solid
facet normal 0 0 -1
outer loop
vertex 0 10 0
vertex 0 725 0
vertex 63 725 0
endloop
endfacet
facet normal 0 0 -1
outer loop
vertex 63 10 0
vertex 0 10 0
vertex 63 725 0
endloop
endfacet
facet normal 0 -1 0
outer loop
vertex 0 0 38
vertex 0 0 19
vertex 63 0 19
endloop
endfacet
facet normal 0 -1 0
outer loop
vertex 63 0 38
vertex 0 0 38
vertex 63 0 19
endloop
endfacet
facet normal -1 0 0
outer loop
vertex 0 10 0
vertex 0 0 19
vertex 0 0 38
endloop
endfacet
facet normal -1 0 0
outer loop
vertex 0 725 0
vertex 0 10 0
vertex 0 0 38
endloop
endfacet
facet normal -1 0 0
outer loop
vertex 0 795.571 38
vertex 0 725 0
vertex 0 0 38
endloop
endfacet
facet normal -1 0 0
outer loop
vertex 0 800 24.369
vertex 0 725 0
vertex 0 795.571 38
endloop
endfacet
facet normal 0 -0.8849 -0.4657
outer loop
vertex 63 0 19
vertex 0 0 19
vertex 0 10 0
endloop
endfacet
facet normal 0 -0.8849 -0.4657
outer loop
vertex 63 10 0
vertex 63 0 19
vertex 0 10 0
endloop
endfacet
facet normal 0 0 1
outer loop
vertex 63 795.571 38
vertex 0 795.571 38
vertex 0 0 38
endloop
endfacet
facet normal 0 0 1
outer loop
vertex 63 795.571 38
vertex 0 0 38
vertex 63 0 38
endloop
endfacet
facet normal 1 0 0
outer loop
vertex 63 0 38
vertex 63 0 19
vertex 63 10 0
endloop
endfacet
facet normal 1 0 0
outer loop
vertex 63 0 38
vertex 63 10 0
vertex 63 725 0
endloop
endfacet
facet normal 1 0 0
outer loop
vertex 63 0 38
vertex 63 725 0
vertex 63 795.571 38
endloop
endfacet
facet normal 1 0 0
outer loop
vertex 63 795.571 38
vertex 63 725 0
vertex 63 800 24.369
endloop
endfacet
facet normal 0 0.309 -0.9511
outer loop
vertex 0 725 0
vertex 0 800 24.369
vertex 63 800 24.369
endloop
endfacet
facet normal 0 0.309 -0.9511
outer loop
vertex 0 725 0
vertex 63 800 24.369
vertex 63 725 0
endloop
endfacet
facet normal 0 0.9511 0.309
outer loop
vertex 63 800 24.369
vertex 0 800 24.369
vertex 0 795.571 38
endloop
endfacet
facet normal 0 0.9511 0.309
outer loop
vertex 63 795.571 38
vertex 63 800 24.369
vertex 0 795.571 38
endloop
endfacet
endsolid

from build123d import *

# Parameters (mm, degrees)
ESQUISSE1_W             = 63
ESQUISSE1_H             = 800
BOSS_EXTRU_1_DEPTH      = 38
ENL_V_MAT_EXTRU_1_DEPTH = 804.376001633
ENL_V_MAT_EXTRU_2_DEPTH = 804.376001633


with BuildPart() as part:
    # Esquisse1 → Boss.-Extru.1 (new body)
    with BuildSketch(Plane.XY):
        with Locations((31.5, 400)):
            Rectangle(ESQUISSE1_W, ESQUISSE1_H)
    extrude(amount=BOSS_EXTRU_1_DEPTH)

    # Esquisse2 → Enlèv. mat.-Extru.1 (cut, through all)
    with BuildSketch(Plane.ZY):
        Polygon((24.368977217, 800), (0, 725), (0, 800), align=None)
        Polygon((19, 0), (0, 10), (0, 0), align=None)
    extrude(amount=-ENL_V_MAT_EXTRU_1_DEPTH, mode=Mode.SUBTRACT)

    # Esquisse3 → Enlèv. mat.-Extru.2 (cut, through all)
    with BuildSketch(Plane.ZY):
        Polygon((24.368977217, 800), (38, 795.571012218), (38, 800), align=None)
    extrude(amount=-ENL_V_MAT_EXTRU_2_DEPTH, mode=Mode.SUBTRACT)


solid = part.part
